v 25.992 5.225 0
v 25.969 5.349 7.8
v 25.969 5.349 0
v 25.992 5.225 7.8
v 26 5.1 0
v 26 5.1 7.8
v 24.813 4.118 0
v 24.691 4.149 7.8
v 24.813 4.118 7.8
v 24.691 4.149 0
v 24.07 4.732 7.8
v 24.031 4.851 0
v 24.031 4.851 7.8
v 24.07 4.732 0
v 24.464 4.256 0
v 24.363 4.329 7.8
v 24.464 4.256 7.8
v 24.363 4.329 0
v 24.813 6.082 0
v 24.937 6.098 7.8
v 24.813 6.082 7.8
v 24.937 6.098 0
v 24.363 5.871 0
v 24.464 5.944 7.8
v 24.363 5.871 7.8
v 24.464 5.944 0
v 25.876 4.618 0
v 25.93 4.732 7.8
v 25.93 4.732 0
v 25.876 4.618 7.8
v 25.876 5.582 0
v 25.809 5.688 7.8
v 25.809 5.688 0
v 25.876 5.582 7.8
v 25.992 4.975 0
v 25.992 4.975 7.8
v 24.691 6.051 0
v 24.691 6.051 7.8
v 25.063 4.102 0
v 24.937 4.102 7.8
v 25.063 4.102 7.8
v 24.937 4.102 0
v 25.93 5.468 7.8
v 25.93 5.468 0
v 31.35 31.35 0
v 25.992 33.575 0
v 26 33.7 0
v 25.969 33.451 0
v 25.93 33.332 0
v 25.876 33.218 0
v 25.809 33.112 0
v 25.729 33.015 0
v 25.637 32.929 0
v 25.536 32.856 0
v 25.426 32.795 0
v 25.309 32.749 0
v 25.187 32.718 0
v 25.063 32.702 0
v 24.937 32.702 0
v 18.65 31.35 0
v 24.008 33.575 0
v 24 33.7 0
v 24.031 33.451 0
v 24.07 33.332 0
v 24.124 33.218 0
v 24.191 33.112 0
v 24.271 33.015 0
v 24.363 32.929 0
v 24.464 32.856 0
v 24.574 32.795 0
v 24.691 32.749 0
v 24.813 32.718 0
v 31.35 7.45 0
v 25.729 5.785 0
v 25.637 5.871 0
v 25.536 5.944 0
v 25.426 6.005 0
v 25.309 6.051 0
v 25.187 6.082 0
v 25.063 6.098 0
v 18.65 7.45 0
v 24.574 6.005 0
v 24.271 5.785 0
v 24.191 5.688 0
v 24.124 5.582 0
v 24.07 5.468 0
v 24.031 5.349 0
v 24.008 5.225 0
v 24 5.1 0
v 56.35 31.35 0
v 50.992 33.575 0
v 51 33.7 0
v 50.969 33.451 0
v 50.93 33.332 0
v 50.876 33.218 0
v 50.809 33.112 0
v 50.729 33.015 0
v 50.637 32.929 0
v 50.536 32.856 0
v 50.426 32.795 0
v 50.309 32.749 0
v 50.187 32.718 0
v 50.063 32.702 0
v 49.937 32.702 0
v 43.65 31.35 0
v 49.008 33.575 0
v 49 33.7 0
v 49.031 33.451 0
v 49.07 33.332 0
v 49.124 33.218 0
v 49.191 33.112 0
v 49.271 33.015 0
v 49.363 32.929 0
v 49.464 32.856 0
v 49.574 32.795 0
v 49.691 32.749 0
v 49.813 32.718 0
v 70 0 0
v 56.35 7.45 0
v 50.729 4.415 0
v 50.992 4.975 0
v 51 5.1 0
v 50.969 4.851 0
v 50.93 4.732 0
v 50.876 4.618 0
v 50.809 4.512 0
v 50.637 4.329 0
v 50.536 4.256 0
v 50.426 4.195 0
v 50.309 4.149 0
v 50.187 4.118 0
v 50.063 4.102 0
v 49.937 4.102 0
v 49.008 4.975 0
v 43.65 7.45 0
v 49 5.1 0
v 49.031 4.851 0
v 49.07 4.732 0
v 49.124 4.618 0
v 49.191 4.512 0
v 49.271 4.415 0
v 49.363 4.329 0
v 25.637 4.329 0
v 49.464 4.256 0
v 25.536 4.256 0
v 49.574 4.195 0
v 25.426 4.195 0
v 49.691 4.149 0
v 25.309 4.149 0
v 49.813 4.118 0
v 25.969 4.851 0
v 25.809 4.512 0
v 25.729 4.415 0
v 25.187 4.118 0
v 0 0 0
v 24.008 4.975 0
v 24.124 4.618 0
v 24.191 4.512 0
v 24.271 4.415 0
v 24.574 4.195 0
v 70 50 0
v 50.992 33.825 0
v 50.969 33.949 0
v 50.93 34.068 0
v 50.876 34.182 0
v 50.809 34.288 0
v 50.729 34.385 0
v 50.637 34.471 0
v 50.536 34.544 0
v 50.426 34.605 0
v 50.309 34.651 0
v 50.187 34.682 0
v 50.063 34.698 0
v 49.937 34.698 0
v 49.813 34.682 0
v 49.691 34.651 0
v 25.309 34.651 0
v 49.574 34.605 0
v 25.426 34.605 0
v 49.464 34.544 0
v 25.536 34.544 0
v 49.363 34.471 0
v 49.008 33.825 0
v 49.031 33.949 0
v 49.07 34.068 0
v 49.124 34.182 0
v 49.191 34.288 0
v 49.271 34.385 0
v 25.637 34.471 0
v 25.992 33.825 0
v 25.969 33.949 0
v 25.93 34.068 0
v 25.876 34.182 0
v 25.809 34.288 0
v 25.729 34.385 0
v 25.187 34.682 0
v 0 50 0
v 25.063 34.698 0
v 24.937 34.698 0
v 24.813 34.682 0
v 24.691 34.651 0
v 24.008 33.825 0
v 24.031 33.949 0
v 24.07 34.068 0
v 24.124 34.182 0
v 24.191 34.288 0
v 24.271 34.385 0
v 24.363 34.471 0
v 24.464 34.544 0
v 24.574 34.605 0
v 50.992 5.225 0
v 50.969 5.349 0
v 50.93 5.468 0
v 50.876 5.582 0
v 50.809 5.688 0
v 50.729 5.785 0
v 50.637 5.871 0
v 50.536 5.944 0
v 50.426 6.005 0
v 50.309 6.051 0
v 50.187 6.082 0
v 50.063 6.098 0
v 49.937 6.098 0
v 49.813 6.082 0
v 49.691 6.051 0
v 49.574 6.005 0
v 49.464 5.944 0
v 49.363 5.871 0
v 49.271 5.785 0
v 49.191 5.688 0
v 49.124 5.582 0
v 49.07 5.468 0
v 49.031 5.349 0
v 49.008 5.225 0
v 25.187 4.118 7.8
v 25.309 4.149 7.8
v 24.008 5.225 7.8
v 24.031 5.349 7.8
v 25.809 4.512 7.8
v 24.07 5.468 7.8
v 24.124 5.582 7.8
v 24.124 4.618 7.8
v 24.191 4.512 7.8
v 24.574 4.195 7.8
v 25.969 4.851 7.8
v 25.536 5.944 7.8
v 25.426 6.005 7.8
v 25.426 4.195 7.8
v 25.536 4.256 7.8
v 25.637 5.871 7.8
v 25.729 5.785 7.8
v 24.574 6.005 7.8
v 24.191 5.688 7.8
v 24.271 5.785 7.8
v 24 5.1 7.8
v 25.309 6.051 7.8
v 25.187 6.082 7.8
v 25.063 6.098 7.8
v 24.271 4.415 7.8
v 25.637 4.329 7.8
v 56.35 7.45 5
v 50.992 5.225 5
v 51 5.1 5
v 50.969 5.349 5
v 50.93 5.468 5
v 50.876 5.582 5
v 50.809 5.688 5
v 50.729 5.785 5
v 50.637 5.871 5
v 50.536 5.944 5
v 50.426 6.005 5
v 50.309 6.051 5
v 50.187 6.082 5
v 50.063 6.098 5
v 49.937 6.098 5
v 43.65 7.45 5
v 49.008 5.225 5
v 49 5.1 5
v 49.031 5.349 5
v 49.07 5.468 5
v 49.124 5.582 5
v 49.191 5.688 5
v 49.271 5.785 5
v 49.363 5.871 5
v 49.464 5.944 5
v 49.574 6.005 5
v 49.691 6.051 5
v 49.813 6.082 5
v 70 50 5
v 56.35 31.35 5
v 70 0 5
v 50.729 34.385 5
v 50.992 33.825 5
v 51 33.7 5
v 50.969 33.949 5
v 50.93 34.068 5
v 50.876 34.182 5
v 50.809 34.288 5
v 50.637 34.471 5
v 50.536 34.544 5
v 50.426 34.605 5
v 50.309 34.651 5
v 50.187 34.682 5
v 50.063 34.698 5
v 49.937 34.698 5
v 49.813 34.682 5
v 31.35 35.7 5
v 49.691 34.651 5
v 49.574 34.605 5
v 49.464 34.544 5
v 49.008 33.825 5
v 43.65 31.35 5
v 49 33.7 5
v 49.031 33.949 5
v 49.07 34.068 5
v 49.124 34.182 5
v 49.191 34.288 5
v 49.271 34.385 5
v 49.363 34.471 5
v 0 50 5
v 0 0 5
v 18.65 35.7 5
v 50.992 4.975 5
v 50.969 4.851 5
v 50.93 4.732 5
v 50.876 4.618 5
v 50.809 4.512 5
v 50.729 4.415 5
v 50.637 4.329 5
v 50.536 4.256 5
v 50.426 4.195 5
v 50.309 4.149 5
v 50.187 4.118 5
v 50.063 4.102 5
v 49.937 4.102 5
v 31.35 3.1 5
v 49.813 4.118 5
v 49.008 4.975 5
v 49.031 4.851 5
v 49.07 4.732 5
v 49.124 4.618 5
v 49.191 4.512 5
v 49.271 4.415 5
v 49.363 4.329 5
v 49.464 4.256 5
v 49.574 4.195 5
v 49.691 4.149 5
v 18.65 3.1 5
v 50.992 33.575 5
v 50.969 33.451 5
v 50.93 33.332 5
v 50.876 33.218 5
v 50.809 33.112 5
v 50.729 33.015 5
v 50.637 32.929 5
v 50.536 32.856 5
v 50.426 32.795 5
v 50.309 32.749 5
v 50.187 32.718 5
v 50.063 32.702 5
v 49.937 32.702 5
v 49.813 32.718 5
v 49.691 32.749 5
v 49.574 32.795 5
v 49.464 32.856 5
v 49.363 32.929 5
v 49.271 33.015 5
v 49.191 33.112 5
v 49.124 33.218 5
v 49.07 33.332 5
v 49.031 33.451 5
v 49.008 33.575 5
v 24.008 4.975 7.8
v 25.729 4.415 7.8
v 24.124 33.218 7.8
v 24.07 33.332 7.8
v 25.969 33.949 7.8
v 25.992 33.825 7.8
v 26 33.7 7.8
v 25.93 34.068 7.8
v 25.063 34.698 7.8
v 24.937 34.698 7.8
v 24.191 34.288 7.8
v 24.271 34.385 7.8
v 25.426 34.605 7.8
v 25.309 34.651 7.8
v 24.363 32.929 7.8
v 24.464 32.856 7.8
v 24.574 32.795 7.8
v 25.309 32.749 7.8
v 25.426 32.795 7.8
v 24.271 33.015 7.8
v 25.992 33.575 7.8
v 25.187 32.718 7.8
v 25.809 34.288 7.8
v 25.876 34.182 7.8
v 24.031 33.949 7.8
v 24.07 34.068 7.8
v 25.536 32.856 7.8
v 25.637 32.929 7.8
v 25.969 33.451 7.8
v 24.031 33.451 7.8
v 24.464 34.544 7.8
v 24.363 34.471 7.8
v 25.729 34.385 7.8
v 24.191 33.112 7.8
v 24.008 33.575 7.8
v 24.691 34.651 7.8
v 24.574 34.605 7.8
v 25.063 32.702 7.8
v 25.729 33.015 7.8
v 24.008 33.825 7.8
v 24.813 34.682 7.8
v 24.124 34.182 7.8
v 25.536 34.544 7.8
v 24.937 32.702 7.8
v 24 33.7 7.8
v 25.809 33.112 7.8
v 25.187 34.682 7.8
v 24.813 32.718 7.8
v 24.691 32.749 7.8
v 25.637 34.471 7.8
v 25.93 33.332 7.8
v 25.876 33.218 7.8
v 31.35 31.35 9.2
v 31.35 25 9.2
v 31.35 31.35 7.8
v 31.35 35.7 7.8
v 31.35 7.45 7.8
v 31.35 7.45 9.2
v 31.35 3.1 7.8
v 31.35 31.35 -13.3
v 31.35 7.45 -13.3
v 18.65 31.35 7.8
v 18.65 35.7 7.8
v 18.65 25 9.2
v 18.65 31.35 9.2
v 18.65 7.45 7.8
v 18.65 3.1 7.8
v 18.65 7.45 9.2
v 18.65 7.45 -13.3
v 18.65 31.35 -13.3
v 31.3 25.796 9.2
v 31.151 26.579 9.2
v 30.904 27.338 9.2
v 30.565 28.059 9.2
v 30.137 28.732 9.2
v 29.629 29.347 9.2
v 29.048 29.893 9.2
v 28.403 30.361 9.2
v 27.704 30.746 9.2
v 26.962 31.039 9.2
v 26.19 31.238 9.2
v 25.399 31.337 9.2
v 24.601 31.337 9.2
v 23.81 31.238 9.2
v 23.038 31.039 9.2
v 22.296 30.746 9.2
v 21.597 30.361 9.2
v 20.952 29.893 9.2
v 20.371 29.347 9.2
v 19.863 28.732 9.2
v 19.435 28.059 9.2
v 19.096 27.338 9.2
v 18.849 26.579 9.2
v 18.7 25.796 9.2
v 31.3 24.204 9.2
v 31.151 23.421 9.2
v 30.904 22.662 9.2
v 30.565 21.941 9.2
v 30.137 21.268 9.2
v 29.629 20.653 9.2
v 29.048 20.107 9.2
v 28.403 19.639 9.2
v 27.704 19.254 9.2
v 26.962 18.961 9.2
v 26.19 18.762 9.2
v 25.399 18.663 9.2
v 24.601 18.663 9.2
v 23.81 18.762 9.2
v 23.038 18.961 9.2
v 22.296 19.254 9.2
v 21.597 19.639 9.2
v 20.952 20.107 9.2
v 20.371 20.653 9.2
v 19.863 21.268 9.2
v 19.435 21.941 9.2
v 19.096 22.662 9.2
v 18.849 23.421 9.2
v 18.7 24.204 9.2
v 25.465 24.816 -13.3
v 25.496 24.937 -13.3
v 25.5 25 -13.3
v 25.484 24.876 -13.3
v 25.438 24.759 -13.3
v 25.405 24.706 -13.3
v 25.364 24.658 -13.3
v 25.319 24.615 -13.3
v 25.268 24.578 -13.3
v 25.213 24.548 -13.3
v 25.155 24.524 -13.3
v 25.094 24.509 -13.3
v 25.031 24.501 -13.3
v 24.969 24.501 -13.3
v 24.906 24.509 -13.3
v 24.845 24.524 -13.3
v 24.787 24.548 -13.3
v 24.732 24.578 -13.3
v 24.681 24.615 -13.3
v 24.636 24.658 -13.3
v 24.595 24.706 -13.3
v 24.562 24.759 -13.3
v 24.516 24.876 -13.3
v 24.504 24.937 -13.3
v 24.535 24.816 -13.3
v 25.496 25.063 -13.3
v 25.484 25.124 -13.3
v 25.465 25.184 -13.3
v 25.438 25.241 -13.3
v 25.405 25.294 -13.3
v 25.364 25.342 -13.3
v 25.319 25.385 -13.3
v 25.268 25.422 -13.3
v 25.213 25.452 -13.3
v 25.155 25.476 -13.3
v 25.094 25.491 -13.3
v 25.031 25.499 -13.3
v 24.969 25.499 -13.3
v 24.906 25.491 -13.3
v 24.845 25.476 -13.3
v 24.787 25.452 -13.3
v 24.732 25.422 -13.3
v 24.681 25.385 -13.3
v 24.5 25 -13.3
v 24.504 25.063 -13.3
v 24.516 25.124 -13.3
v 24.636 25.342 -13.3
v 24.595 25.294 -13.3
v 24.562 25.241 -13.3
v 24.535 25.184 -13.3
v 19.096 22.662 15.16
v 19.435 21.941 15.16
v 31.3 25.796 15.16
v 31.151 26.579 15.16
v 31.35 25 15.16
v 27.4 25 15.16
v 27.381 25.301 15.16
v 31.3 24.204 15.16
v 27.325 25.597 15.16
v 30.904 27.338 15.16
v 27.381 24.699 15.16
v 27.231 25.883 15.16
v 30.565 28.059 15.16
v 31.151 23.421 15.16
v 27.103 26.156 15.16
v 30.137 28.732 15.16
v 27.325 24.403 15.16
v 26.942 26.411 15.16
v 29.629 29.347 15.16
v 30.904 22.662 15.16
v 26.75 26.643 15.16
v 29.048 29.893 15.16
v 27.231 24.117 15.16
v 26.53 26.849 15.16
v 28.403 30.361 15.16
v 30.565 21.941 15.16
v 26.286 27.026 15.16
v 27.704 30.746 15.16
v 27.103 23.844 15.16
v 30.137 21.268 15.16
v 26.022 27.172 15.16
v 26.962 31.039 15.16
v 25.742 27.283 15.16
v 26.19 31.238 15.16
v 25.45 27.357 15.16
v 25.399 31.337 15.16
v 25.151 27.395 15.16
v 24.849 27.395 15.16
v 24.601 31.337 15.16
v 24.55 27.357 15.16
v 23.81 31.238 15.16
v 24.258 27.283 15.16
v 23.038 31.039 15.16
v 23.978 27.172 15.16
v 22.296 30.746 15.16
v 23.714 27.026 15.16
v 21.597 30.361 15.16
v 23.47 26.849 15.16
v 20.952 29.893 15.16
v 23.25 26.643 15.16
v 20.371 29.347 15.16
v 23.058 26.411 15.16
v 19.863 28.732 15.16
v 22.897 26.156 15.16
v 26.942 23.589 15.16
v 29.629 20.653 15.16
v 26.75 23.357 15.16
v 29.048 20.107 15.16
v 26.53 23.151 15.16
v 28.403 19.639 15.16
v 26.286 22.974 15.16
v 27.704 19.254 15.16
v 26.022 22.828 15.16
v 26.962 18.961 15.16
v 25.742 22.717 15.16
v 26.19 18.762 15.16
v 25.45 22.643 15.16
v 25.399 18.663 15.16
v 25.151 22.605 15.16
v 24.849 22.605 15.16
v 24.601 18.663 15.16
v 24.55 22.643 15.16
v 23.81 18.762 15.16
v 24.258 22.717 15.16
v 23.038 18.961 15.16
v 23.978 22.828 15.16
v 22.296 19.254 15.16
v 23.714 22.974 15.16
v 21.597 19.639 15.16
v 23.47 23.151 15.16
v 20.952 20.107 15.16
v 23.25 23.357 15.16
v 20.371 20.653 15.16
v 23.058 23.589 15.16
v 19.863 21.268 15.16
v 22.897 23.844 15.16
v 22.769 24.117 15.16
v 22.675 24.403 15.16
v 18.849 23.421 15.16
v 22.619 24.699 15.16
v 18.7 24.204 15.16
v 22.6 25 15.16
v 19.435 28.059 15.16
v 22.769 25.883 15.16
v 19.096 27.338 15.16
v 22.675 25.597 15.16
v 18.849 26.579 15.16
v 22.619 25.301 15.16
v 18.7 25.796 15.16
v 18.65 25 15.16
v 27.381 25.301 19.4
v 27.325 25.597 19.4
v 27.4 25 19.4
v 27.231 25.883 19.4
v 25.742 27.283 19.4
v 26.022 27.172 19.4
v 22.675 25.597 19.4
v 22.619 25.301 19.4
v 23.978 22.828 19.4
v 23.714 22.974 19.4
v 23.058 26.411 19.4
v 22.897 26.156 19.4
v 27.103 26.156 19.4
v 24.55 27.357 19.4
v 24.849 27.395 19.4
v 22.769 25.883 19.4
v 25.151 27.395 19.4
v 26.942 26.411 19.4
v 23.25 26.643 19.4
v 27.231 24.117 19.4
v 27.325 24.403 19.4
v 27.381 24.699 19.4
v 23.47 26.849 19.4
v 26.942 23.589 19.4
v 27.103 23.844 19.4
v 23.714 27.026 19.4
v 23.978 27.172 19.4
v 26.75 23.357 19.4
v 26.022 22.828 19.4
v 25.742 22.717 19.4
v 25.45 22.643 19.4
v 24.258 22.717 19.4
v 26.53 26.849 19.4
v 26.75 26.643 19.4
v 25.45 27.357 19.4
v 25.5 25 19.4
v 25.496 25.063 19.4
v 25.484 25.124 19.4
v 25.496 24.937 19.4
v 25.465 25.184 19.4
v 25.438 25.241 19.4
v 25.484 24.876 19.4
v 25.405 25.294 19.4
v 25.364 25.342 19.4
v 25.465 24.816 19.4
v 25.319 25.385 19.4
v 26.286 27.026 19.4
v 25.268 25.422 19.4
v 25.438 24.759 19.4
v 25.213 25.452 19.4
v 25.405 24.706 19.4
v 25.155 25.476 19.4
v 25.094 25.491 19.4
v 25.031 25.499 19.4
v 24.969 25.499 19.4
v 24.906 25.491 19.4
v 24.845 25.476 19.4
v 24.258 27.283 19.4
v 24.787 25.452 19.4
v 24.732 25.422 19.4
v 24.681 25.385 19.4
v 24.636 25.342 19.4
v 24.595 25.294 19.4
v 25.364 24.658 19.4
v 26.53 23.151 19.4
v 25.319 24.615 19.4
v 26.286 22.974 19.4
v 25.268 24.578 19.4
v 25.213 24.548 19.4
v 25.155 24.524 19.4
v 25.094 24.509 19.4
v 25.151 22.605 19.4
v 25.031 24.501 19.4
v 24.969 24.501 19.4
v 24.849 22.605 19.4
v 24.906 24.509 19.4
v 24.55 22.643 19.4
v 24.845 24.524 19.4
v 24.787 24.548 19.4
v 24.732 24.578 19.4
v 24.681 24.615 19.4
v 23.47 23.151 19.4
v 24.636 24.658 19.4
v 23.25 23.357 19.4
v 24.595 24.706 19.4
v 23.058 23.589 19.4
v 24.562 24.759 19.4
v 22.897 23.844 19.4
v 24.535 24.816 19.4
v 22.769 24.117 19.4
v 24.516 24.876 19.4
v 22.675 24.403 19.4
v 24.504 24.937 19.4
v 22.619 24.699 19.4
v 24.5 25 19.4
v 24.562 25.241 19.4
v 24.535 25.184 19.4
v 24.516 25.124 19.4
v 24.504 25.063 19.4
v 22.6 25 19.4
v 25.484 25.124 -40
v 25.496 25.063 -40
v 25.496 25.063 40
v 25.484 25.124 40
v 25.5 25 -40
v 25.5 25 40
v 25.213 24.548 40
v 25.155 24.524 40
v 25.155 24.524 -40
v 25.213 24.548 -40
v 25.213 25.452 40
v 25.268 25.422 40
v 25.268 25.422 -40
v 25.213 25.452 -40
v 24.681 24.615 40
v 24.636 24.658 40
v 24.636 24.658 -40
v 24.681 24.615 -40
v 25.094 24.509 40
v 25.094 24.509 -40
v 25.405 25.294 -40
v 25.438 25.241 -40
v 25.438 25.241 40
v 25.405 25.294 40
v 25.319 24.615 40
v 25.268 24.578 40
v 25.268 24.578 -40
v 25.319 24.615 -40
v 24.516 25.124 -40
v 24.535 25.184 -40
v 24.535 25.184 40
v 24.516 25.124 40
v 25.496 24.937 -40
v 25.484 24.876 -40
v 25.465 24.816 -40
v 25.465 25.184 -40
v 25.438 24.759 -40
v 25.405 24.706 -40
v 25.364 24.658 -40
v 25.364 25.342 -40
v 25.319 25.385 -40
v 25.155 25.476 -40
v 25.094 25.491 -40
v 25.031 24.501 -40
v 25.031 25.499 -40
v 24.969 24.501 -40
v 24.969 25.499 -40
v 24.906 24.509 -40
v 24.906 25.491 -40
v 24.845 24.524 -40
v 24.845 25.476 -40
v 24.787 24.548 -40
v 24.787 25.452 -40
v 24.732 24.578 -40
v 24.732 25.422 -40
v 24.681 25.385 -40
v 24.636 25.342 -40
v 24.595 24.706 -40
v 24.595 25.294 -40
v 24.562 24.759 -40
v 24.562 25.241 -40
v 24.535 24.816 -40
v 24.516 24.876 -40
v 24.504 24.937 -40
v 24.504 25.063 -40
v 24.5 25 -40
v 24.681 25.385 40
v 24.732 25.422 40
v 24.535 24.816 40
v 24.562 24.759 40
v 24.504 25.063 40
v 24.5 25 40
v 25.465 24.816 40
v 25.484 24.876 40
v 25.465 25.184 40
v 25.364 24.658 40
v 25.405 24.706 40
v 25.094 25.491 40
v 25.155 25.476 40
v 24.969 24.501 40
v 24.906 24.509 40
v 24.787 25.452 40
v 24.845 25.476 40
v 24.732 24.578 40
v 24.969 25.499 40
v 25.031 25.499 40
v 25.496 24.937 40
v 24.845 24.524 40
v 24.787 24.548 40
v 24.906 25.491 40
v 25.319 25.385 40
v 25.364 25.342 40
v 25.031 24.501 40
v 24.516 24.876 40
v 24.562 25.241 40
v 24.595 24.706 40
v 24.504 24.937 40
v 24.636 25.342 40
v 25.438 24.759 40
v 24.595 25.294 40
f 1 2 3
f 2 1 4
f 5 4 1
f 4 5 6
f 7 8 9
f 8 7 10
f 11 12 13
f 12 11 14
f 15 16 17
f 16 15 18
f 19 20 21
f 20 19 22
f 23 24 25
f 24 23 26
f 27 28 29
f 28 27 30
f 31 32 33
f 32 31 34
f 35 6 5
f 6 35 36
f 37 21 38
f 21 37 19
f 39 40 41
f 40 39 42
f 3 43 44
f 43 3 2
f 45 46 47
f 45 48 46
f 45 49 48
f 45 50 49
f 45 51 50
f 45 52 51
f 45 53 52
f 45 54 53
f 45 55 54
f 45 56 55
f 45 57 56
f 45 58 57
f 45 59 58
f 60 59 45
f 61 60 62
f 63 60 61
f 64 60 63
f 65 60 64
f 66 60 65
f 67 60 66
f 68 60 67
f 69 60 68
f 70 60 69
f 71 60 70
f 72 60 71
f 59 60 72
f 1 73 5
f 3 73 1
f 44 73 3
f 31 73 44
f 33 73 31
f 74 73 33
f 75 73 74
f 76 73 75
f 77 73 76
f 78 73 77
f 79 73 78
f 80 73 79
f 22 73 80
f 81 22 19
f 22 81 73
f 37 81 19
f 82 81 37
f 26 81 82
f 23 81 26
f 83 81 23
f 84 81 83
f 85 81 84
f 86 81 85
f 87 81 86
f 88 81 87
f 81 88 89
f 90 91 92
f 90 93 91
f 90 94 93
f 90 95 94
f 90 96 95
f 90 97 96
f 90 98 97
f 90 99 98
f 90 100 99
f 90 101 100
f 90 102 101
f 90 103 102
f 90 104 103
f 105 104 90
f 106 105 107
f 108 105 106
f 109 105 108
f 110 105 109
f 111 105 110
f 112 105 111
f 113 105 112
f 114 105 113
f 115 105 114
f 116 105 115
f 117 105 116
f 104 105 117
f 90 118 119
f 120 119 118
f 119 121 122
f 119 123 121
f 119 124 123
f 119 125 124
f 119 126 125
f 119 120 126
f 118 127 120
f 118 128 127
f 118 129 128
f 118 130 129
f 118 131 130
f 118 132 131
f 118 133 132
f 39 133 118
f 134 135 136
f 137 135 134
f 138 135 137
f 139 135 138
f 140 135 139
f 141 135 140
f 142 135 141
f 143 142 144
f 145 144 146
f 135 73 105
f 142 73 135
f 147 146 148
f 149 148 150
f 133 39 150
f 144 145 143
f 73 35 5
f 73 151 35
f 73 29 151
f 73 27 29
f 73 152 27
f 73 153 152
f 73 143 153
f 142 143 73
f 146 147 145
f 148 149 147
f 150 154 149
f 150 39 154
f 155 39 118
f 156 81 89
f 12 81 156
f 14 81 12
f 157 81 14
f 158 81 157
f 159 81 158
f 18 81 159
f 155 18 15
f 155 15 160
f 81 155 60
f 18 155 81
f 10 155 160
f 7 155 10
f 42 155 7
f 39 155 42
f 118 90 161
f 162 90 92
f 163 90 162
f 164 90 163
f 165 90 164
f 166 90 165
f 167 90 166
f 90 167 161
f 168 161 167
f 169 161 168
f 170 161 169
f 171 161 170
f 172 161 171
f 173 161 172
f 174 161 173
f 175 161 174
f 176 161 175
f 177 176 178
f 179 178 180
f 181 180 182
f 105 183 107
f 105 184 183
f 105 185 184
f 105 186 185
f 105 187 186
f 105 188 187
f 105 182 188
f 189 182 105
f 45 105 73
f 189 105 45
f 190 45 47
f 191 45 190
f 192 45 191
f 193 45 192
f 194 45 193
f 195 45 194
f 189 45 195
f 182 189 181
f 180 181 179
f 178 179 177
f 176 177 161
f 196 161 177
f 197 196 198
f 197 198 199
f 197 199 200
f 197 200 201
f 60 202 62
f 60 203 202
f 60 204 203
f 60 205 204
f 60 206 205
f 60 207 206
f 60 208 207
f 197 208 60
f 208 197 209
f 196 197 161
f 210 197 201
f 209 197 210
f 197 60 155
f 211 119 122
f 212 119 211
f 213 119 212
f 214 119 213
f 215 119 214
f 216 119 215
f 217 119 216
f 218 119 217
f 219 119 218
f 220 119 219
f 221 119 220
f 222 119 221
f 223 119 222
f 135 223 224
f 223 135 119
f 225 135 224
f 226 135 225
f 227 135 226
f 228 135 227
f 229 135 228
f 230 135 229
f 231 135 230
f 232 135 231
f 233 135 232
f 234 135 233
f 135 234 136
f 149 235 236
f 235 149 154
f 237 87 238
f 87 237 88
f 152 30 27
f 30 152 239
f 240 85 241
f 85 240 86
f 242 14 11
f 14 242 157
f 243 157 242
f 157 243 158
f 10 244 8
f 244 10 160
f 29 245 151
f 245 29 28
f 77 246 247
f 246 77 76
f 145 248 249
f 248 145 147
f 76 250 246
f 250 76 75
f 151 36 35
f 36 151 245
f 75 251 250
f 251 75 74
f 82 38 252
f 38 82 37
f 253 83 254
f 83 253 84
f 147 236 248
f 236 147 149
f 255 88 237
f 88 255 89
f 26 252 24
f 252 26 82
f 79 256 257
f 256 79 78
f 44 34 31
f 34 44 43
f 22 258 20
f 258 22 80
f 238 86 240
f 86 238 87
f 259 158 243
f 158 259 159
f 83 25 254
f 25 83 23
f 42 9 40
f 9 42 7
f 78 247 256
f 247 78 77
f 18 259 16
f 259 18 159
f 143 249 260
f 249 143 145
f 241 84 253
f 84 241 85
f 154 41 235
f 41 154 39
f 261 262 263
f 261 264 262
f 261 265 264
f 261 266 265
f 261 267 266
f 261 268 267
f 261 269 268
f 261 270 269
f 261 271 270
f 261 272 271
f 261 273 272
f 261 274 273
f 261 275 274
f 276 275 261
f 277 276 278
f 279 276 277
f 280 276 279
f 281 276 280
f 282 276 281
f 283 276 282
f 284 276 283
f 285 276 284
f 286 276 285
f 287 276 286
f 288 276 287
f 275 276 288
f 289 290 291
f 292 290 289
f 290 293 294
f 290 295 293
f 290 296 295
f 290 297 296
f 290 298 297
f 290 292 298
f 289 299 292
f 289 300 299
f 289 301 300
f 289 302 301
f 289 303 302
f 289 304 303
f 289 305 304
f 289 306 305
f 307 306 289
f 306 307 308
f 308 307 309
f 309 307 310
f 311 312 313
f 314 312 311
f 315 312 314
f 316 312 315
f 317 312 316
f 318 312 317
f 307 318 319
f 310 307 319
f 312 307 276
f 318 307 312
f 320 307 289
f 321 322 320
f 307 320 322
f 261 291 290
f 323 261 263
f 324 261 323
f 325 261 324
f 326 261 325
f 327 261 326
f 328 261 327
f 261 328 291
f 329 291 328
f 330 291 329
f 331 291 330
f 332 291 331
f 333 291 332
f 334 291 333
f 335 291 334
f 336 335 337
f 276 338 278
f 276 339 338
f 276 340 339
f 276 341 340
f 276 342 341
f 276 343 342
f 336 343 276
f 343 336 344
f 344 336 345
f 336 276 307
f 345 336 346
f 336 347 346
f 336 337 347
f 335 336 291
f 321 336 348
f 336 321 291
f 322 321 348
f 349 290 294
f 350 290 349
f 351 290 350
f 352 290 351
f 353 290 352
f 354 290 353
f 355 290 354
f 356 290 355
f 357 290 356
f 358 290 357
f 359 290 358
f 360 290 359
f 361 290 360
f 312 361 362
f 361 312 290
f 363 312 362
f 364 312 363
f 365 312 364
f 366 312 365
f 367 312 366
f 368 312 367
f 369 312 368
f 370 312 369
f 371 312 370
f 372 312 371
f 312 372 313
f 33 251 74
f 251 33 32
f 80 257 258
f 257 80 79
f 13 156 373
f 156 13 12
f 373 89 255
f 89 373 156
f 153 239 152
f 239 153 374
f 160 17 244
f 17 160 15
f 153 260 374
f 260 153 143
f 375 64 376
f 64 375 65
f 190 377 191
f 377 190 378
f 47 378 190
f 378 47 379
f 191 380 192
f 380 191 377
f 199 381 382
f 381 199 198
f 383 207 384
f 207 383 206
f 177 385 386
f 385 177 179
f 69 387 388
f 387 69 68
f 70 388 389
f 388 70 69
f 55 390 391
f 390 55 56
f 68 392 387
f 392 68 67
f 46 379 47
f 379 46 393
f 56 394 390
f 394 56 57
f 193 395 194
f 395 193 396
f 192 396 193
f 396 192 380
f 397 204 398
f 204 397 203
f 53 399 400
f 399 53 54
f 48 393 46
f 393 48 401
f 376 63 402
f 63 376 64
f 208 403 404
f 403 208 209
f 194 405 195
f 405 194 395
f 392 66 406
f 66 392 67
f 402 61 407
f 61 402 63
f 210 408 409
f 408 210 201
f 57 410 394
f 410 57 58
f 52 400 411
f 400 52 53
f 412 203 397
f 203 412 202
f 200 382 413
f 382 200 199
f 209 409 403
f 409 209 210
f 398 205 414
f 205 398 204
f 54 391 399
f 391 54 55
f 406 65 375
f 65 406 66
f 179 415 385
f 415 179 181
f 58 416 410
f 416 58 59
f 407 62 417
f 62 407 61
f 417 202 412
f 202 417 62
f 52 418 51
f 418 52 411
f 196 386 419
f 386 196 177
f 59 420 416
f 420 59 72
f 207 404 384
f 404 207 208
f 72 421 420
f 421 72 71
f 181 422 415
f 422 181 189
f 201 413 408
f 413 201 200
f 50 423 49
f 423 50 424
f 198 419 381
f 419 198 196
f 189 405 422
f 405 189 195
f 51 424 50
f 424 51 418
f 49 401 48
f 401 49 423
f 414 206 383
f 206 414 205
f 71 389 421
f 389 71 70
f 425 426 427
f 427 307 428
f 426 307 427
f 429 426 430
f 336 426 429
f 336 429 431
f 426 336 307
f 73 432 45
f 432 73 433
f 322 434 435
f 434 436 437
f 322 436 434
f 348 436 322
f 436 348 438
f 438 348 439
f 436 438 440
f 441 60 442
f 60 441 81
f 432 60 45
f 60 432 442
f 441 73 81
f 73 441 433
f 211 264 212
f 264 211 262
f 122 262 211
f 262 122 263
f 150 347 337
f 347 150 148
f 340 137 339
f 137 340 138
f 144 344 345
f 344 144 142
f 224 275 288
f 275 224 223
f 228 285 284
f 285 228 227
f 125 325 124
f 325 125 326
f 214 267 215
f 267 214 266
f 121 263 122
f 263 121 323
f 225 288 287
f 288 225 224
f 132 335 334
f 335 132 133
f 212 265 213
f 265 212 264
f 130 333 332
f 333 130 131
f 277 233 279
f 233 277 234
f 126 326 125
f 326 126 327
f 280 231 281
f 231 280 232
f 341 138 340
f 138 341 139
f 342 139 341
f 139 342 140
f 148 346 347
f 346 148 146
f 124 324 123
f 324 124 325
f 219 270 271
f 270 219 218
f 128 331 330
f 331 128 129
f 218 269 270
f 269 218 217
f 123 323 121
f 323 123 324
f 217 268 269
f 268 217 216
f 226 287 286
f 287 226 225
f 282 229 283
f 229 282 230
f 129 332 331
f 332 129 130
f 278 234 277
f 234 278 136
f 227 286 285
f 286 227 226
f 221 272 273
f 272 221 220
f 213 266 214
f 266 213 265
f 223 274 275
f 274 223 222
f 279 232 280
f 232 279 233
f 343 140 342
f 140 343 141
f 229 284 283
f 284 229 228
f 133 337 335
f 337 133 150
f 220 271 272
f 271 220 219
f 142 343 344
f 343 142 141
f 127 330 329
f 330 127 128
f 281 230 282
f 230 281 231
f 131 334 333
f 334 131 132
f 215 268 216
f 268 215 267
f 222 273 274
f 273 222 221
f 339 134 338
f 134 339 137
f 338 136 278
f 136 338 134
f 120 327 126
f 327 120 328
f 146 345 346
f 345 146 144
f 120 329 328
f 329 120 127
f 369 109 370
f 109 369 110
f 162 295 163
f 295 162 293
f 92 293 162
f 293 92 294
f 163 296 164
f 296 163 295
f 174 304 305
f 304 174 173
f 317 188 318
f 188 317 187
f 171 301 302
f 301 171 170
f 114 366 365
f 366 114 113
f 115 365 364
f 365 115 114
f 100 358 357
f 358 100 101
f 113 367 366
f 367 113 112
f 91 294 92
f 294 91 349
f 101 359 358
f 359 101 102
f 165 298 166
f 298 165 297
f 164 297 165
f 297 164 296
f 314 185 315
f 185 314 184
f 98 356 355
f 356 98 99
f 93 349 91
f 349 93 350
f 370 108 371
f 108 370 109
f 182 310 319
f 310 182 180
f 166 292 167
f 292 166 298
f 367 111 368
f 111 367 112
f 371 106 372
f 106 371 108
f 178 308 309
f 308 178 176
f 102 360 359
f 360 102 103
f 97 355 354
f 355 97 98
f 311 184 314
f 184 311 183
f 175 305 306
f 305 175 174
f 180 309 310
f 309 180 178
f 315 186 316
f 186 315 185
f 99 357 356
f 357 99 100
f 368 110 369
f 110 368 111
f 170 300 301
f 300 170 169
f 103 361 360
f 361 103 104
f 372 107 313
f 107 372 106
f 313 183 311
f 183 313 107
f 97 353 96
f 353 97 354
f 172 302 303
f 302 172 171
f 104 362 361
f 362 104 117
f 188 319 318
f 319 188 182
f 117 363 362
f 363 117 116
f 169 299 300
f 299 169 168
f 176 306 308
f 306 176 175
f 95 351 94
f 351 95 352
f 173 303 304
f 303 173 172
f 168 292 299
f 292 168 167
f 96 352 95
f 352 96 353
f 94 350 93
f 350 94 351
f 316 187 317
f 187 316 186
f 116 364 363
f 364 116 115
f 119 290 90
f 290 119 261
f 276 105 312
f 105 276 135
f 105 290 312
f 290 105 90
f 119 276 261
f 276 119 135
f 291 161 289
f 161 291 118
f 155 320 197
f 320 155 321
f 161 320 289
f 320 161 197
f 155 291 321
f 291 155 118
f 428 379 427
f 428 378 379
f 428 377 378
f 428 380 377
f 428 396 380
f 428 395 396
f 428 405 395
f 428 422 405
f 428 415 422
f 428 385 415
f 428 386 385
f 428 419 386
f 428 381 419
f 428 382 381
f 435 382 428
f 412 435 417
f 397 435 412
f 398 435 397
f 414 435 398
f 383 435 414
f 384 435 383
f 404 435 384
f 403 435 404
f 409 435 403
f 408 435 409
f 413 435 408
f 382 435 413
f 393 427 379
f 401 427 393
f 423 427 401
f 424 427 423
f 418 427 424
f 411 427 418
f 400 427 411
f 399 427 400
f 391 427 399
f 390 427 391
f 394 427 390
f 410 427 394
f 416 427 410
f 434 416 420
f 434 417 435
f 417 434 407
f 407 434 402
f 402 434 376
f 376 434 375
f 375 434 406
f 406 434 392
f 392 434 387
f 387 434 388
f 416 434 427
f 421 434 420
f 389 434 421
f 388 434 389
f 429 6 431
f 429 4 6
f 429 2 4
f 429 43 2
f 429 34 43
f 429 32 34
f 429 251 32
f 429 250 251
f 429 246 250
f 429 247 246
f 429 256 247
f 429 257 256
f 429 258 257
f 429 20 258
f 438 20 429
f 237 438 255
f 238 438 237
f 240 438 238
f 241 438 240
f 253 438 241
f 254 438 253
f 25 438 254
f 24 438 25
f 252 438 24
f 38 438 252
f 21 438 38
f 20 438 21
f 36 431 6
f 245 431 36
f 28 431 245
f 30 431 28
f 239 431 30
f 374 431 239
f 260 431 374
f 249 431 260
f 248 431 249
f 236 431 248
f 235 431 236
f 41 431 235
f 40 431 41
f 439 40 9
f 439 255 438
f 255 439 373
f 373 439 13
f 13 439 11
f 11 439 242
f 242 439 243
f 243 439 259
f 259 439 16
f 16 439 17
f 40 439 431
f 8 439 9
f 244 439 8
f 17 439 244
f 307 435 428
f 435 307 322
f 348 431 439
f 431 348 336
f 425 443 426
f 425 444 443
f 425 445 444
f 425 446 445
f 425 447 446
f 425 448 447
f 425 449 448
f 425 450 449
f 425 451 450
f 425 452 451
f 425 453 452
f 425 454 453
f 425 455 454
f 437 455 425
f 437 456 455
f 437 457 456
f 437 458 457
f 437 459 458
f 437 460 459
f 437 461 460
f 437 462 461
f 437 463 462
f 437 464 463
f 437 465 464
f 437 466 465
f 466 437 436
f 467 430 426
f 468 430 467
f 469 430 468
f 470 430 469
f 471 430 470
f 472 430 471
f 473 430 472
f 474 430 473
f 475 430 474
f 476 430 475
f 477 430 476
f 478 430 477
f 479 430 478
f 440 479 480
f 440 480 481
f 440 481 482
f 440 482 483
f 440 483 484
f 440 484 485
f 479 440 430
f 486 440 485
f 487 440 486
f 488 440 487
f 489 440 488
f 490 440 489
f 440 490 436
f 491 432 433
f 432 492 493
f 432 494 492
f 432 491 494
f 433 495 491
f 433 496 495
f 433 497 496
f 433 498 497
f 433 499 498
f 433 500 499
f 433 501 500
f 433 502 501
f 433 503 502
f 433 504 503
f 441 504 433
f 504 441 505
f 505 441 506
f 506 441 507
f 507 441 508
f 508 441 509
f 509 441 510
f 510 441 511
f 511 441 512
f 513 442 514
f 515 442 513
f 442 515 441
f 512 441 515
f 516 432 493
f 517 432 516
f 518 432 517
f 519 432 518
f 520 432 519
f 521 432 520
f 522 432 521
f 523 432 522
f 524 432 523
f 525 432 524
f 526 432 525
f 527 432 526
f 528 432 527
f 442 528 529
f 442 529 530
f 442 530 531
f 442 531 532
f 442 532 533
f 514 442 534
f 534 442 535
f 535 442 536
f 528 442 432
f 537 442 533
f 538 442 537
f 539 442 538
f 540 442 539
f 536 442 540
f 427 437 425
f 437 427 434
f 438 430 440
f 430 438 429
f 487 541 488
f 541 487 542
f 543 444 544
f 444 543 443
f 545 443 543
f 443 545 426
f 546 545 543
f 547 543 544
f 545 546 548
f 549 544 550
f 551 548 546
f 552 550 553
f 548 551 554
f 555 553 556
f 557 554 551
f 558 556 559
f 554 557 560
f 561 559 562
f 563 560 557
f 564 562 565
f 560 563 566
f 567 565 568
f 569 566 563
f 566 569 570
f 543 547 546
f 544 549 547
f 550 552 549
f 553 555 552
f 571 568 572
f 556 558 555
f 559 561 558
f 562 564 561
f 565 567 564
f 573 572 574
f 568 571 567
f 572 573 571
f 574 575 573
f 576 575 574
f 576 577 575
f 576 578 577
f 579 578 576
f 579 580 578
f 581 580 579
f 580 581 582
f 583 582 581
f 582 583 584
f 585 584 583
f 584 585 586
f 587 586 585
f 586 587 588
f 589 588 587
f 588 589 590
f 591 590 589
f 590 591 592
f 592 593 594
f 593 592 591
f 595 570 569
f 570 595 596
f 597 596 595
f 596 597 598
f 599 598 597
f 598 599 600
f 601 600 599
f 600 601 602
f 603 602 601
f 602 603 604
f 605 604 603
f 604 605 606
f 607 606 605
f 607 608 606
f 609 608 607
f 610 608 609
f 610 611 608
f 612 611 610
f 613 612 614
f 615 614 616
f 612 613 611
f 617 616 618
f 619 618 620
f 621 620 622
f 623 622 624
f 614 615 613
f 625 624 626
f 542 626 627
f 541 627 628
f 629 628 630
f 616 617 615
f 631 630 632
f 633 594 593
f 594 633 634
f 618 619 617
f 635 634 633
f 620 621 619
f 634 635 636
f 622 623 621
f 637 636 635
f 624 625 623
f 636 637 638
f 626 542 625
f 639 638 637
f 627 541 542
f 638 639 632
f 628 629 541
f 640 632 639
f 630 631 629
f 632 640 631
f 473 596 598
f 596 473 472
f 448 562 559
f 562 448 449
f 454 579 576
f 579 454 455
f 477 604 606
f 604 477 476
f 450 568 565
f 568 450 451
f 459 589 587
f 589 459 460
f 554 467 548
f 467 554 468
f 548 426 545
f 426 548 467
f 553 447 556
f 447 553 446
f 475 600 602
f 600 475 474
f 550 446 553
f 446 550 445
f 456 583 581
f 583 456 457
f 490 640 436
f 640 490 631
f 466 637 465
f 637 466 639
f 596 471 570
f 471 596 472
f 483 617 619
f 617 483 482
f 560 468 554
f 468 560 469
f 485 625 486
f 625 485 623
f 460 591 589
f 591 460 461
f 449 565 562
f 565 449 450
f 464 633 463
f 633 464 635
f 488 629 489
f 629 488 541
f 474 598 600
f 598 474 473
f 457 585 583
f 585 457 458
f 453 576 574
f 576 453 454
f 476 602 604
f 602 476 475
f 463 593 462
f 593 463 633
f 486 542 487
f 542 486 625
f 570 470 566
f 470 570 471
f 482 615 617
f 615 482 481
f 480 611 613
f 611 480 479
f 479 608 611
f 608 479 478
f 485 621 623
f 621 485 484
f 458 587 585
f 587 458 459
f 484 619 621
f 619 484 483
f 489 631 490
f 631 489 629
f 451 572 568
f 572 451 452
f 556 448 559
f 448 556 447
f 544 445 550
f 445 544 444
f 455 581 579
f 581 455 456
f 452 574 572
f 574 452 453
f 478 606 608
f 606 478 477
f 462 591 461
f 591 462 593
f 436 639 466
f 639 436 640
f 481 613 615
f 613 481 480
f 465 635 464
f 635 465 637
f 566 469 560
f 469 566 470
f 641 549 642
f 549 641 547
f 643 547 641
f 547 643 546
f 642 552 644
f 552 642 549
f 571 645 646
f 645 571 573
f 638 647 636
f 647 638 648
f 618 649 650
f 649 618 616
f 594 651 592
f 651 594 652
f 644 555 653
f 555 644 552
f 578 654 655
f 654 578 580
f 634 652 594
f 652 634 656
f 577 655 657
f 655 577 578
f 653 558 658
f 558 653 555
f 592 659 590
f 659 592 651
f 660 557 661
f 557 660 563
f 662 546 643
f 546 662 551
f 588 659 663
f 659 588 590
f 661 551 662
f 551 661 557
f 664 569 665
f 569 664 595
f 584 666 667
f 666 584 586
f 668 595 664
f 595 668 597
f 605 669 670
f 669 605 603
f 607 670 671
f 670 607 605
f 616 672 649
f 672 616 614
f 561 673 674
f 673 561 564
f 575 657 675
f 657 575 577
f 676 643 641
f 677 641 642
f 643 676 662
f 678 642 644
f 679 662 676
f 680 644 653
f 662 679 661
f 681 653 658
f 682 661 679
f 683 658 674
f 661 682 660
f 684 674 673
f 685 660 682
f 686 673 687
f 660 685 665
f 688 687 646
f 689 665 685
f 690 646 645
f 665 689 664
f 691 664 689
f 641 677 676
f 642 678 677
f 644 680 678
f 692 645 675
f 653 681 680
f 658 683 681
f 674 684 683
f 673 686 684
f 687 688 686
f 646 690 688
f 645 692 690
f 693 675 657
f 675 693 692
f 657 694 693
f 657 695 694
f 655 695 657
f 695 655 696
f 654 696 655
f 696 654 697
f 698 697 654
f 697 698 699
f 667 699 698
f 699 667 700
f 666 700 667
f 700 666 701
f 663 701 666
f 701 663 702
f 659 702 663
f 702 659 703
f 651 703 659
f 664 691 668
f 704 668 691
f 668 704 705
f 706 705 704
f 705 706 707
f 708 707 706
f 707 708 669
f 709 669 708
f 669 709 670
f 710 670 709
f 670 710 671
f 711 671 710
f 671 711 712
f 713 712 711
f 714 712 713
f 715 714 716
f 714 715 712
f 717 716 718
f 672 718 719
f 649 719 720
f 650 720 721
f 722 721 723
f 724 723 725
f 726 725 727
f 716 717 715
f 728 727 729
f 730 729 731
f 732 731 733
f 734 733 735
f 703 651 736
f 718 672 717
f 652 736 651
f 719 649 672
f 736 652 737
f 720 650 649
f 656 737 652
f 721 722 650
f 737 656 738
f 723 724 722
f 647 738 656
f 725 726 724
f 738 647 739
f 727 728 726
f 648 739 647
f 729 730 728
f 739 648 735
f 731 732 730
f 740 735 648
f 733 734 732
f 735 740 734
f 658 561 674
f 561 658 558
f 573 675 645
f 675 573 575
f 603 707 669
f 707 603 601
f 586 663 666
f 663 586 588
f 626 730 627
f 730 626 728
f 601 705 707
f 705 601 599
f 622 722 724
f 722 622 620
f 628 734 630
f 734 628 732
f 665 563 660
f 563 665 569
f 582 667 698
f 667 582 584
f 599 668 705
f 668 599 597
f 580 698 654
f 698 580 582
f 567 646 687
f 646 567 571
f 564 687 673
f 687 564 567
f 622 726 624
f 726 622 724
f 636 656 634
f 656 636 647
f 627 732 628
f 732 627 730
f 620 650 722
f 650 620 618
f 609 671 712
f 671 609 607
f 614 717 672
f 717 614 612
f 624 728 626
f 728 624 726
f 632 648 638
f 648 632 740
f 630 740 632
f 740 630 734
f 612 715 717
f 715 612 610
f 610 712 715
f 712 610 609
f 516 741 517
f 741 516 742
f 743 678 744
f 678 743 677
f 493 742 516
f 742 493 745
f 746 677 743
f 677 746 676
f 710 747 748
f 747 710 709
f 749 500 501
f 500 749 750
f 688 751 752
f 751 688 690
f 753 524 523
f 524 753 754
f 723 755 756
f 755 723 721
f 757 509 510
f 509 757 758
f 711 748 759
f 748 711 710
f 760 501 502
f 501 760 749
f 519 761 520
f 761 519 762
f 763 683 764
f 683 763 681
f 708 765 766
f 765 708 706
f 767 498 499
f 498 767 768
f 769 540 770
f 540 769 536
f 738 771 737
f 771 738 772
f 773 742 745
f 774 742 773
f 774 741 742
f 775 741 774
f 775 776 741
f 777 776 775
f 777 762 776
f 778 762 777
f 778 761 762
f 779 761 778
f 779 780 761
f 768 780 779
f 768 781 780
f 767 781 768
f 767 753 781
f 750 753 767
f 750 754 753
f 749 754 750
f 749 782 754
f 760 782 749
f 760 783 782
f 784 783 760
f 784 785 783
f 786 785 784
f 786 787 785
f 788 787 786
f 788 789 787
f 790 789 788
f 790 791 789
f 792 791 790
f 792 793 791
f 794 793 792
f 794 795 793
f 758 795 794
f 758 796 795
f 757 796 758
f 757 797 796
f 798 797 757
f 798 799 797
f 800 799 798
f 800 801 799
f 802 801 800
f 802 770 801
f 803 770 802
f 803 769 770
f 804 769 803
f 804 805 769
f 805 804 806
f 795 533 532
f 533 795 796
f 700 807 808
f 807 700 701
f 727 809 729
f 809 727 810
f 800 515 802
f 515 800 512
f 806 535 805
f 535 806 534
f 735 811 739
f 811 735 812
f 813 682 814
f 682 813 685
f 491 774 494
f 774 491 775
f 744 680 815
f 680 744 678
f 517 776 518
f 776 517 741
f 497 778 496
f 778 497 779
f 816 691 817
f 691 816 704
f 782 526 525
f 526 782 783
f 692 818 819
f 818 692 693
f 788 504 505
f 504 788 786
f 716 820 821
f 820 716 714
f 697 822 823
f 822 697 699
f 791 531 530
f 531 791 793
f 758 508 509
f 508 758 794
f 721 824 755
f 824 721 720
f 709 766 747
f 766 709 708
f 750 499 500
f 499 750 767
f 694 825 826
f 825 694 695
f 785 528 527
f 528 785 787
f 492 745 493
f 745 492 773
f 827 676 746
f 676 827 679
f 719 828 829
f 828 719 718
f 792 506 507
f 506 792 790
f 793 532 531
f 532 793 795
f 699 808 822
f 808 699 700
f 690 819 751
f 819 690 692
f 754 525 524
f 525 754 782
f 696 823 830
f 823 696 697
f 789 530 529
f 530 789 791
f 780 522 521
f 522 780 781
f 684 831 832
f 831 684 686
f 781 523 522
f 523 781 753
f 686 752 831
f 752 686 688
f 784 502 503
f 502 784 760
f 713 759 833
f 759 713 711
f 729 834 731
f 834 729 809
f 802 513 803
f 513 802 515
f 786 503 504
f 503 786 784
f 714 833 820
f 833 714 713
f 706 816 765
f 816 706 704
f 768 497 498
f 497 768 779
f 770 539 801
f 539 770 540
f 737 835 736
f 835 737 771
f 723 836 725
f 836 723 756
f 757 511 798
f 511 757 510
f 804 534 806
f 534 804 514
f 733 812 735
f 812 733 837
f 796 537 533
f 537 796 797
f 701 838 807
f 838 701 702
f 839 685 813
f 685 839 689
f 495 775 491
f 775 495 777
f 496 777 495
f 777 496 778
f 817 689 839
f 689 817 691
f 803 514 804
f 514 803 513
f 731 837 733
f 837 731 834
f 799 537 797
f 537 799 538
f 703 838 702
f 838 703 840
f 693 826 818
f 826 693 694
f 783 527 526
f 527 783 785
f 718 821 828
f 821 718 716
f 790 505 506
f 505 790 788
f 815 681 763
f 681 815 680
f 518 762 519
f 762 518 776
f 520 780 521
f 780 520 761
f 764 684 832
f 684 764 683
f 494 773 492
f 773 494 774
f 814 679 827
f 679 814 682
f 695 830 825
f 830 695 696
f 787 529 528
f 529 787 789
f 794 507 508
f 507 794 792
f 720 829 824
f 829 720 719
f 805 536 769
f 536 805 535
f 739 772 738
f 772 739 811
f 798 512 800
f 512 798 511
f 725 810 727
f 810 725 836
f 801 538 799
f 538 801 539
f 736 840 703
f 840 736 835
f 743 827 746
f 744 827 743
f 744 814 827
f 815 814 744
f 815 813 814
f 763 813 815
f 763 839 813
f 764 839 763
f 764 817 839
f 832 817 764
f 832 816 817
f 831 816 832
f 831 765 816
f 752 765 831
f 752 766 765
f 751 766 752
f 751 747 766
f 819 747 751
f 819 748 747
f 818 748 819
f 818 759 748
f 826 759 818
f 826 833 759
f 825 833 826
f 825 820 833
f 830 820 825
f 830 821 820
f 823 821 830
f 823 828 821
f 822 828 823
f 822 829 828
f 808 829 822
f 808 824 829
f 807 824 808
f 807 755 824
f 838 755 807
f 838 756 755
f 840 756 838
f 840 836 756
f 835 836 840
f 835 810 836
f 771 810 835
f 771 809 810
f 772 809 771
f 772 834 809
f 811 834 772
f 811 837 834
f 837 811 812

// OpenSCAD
// model of and supporting models for a (micro) servo
// author: Christophe VG <contact@christophe.vg>

$fn = 50;

// examples:
// KY66 SG90 Micro Servo Motor        : 23   x 12.2 x 29   mm
// KY61 MG90S Metal Micro Servo Motor : 22.8 x 12.2 x 28.5 mm
// Tower Pro SG90 Digital             : 23   × 12.2 x 29   mm

// see image drawing dimensions for information
// about measurements a through f to configure the modules

// Kuman MG 90S (=Tower Pro SG90)
$a  = 32.70;  // height bottom to top of spline
$b  = 23.90;  // length short side to side
$cb = 22.50;  // height of body
$ct =  5.96;  // height of turret
$d  = 12.70;  // width long side to side
$e  = 32.60;  // length, including wings
$f  = 18.30;  // height bottom to underside of wings
// wings - to check
$wt =  2.80;        // thinkness of wings
$wd =  2.00;        // diameter of screw holes
$wc =  2.00;        // distance from wing border
// spline
$sd =  4.80;       // diameter

function servo_top() = $a;
function servo_wing_to_top() = $a - $f;

// servo - the 3d model of the servo
// centered around vertical axis through middle of spline
// and leveled around the mounting wings
// default: top-mounted, bottom-mounted via "bottom" parameter/flag
module servo(bottom=false, clearance=0) {
  x = $d + 2*clearance;
  y = $b + 2*clearance;
  
  translate([-x/2, -(y-x/2), -$f + (bottom ? -$wt : 0) ]) {
    // main body
    cube( [x, y, $cb] );
    // wings
    translate([0, -($e - y)/2, $f]) {
      difference() {
        cube( [x, $e, $wt] );
        // screw holes
        translate([x/2, $wc, 0])    { cylinder( $wt, d=$wd ); }
        translate([x/2, $e-$wc, 0]) { cylinder( $wt, d=$wd ); } 
      }
    }
    // "turret"
    translate([x/2, y-x/2, $cb ]) {
      cylinder($ct, d=$d);
    }
    // spline
    translate([x/2, y-x/2, $cb + $ct ]) {
      cylinder($a - $cb - $ct, d=$sd);
    }
  }
}

// servo_mount - the cutout that can hold the servo
// centered around vertical axis through middle of spline
module servo_mount(t=$a) {
  translate([-$d/2, -($b-$d/2), 0]) {
    // main body
    cube( [$d, $b, t] );
    // screw holes
    translate([0, -($e - $b)/2, 0]) {
      translate([$d/2, $wc, 0])    { cylinder( t, d=$wd ); }
      translate([$d/2, $e-$wc, 0]) { cylinder( t, d=$wd ); } 
    }
  }
}

module demo() {
  difference() {
    cube([ 70, 50, 5 ] );
    translate([25, 25, 0]) { servo_mount(t=5); }
    translate([50, 25, 0]) { servo_mount(t=5); }
  }
  translate([25, 25, 5]) { color("red") { servo(); } }
  // the servo and mount are centered around the spline
  translate([25, 25, -40]) { color("blue") { cylinder(80, d=1); } }
}

$vpt = [ 34.08, 24.46, 2.75 ];
$vpr = [ 67.60, 0.00, 40.40 ];
$vpd = 146.615;
demo();
